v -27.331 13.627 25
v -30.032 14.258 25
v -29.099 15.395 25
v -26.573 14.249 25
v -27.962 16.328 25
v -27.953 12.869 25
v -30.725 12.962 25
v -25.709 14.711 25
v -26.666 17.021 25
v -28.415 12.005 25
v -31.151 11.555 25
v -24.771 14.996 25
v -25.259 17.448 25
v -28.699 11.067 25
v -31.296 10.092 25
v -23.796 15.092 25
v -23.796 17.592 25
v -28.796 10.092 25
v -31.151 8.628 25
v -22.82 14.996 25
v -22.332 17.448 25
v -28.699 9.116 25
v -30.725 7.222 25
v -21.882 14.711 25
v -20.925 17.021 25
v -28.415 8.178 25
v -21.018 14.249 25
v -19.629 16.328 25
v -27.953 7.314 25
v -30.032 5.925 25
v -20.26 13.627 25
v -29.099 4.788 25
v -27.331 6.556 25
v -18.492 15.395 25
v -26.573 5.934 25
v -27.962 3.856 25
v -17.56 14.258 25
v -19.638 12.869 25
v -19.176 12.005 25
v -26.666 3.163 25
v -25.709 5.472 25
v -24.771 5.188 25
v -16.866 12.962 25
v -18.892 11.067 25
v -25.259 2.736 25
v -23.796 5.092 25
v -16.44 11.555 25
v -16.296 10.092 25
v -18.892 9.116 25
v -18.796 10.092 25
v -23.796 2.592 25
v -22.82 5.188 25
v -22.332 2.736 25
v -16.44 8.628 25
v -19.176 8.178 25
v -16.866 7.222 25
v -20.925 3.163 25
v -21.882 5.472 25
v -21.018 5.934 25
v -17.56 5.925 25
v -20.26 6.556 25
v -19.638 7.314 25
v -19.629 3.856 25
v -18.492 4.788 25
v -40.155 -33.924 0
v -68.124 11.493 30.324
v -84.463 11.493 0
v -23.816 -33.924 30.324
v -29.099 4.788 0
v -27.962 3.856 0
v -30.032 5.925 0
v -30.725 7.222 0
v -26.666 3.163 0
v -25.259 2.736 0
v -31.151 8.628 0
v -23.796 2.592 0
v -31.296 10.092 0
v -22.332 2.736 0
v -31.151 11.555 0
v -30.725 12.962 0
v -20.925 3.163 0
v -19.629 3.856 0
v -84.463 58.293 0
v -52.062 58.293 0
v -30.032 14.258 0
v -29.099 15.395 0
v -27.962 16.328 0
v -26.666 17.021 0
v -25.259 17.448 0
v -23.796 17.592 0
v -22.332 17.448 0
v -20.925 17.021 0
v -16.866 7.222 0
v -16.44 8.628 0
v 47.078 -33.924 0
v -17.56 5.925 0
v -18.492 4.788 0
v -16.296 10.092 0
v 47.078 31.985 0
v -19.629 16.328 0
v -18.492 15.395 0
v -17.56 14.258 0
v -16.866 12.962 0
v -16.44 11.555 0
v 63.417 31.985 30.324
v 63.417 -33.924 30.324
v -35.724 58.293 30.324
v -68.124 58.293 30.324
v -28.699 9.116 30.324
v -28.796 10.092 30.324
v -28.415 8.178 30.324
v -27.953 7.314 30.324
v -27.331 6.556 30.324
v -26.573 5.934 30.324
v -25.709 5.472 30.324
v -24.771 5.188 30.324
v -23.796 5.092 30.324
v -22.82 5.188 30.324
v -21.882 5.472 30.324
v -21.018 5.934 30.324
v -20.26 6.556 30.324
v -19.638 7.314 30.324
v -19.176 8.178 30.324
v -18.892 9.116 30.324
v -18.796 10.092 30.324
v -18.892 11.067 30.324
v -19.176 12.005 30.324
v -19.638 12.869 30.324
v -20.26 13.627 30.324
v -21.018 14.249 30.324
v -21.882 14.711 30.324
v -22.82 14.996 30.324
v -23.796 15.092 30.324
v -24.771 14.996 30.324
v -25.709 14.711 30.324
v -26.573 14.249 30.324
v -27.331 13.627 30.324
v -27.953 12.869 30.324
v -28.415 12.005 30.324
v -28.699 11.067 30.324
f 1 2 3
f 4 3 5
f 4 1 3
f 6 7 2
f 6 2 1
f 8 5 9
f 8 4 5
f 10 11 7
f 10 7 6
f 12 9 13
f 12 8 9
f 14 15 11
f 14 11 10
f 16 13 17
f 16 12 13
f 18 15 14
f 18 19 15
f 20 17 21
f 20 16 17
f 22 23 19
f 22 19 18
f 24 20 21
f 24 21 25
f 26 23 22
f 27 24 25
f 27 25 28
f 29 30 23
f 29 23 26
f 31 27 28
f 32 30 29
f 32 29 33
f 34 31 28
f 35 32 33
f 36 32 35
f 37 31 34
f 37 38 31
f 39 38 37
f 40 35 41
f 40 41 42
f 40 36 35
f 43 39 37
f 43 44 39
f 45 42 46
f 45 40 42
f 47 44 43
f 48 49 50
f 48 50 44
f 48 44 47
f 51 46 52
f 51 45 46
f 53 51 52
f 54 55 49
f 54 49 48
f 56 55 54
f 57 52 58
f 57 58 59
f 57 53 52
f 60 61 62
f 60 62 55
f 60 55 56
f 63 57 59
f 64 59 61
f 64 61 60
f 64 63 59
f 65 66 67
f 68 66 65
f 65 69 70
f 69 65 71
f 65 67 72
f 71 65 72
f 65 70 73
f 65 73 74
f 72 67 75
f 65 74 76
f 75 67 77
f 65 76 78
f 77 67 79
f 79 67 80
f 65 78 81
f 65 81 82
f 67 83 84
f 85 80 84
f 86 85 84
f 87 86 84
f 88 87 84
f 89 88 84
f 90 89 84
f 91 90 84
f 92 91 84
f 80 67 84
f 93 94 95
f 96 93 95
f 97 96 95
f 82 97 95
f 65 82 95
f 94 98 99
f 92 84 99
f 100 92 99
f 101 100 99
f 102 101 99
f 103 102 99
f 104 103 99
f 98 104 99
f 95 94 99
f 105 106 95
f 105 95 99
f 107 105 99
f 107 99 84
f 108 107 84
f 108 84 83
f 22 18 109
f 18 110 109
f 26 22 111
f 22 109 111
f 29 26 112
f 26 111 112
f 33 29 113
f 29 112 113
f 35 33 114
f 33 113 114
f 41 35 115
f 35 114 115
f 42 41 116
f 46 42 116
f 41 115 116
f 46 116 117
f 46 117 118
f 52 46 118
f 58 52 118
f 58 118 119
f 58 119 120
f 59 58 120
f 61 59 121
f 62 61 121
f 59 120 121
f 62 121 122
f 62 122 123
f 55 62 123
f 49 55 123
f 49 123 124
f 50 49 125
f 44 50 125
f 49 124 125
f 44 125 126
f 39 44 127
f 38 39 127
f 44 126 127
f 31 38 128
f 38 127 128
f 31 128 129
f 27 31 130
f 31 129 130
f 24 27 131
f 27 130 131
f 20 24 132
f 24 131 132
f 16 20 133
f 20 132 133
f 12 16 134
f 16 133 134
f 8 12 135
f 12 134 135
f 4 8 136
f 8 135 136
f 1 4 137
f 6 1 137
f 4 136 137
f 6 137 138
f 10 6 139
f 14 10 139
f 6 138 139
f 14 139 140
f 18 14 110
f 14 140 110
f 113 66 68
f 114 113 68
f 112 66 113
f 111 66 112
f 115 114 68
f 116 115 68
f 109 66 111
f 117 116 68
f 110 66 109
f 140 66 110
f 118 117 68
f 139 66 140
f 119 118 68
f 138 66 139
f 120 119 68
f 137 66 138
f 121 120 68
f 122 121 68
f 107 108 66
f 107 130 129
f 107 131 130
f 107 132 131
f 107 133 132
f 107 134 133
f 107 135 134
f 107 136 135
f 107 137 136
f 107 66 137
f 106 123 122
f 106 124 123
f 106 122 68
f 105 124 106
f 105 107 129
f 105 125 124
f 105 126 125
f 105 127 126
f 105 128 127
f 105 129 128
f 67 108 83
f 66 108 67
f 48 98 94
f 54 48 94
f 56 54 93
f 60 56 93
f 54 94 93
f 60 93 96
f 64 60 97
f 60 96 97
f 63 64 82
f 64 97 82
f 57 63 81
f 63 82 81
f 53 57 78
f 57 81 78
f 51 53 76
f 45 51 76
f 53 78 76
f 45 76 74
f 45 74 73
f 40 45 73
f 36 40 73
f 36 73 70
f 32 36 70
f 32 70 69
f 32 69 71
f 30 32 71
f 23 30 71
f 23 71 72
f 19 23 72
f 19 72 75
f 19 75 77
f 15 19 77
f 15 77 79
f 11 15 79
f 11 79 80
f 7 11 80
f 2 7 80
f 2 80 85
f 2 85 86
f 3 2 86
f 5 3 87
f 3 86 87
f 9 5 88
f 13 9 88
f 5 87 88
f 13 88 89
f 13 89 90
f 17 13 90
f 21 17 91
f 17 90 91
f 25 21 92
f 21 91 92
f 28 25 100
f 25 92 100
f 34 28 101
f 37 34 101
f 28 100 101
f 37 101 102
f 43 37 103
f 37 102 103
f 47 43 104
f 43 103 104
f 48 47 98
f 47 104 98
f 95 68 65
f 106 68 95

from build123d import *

# Parameters (mm, degrees)
F0_W           = 87.232299149
F0_H           = 65.9088492393
F0_W_2         = 32.4005670846
F0_H_2         = 46.8008210883
F4_D           = 10
F4_CBORE_D     = 15
F4_CBORE_DEPTH = 25


with BuildPart() as f2:
    # F2: sweep along a path in F1
    with BuildLine(Plane.XZ) as f2_path:
        Line((3.3231333364, 0), (19.6618847549, 30.3236078471))
    # F0 (on Top) → F2 (sweep)
    with BuildSketch(Plane.XY):
        Polygon((-40.1545502245, -33.9236706495), (-40.1545502245, 31.9851785898), (47.0777489245, 31.9851785898), (-52.0624481142, 58.2933314145), (-52.0624481142, 11.4925103262), (-84.4630151987, 11.4925103262), align=None)
        with Locations((3.46159935, -0.9692460299)):
            Rectangle(F0_W, F0_H)
        with Locations((-68.2627316564, 34.8929208703)):
            Rectangle(F0_W_2, F0_H_2)
    sweep(path=f2_path.line)

    # F4 (through all)
    with Locations(Plane(origin=(0, 0, 0), x_dir=(1, 0, 0), z_dir=(0, 0, -1))):
        with Locations((-23.7955544144, -10.0916447118)):
            CounterBoreHole(F4_D / 2, F4_CBORE_D / 2, F4_CBORE_DEPTH)


solid = f2.part
